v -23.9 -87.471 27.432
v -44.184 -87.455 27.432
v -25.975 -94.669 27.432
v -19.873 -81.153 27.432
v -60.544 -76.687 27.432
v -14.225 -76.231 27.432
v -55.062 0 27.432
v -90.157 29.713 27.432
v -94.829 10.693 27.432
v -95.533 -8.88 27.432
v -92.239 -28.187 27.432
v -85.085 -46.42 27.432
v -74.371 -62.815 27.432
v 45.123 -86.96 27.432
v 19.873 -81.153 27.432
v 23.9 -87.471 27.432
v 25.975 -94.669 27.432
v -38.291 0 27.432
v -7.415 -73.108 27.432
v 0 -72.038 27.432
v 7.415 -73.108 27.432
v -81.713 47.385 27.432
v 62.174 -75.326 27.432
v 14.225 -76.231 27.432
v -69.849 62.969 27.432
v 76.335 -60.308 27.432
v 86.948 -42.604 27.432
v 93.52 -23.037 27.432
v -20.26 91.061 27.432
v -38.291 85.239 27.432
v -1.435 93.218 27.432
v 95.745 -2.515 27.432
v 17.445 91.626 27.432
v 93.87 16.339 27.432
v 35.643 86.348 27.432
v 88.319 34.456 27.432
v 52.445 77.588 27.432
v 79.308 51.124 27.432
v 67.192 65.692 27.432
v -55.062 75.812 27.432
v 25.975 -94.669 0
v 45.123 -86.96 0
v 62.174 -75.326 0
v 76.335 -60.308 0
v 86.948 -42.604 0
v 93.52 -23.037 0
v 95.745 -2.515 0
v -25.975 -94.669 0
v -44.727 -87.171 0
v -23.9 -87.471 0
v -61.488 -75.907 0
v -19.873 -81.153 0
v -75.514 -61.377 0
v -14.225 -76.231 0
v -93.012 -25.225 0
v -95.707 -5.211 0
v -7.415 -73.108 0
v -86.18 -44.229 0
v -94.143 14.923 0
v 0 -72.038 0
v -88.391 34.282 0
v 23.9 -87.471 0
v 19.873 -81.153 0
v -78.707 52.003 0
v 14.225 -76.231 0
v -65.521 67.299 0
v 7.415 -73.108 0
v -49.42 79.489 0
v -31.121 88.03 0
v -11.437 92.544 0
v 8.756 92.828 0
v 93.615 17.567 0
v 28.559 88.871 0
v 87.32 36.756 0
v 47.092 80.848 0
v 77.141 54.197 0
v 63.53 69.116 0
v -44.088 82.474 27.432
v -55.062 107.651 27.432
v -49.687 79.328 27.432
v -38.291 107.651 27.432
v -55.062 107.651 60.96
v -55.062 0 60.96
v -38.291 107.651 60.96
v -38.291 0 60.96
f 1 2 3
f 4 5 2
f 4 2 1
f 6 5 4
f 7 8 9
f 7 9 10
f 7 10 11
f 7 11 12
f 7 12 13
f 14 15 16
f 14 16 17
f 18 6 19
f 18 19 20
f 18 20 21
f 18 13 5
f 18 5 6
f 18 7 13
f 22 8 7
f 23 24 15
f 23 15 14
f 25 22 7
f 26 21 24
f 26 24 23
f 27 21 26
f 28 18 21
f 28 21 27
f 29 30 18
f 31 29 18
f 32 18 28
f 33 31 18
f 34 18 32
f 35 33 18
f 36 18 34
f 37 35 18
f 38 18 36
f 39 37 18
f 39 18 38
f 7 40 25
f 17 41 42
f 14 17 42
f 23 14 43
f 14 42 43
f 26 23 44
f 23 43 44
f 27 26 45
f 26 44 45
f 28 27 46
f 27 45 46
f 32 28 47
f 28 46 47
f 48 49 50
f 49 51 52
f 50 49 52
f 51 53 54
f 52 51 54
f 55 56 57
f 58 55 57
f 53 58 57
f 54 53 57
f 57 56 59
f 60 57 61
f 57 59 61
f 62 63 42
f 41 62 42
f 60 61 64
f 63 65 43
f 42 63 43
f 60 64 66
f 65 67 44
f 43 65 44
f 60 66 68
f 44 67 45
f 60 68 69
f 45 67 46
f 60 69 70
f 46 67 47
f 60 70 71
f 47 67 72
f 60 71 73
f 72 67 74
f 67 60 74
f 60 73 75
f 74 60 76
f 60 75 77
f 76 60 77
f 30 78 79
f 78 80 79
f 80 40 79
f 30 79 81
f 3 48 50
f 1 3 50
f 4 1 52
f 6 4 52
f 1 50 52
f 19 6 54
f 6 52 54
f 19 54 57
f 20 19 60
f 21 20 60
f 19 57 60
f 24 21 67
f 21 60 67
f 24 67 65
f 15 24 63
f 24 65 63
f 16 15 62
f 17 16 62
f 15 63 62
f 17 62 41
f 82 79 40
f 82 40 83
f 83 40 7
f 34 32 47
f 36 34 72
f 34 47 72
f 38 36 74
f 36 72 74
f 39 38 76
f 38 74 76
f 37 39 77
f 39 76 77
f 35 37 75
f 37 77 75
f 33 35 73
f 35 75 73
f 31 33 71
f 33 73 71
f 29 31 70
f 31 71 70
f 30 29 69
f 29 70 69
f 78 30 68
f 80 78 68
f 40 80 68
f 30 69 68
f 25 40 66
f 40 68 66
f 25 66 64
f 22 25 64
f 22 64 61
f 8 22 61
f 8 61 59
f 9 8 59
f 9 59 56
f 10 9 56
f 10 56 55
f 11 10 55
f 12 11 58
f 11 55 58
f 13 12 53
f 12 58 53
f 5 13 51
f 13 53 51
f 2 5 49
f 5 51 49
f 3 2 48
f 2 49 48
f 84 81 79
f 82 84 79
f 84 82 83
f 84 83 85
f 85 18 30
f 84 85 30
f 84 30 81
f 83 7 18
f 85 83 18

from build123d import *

# Parameters (mm, degrees)
F3_DEPTH = 27.432
F5_DEPTH = 33.528


# Not quite as in the source:
# - the program builds the solid bodies; features that only make, move or delete a surface that nothing else refers to are left out


with BuildPart() as f3:
    # F2 (on Top) → F3 (new body)
    with BuildSketch(Plane.XY):
        with BuildLine():
            ThreePointArc((25.9753267238, -94.6690976426), (76.334874565, -60.3082301144), (95.7446020854, -2.515360713))
            ThreePointArc((95.7446020854, -2.515360713), (-57.7928694014, 73.819513852), (-25.9753267238, -94.6690976426))
            ThreePointArc((-25.9753267238, -94.6690976426), (0, -72.0376076224), (25.9753267238, -94.6690976426))
        make_face()
    extrude(amount=F3_DEPTH)

    # F4 (on face) → F5 (join)
    with BuildSketch(Plane.XY.offset(27.432)):
        with BuildLine():
            ThreePointArc((-55.0617836416, 75.8123407131), (-46.9138023818, 80.9479484388), (-38.2910855114, 85.23896453))
            Line((-38.2910855114, 85.23896453), (-38.2910855114, 107.650950551))
            Line((-38.2910855114, 107.650950551), (-55.0617836416, 107.650950551))
            Line((-55.0617836416, 107.650950551), (-55.0617836416, 75.8123407131))
        make_face()
        with BuildLine():
            Line((-55.0617836416, 0), (-38.2910855114, 0))
            Line((-38.2910855114, 0), (-38.2910855114, 85.23896453))
            ThreePointArc((-38.2910855114, 85.23896453), (-46.9138023818, 80.9479484388), (-55.0617836416, 75.8123407131))
            Line((-55.0617836416, 75.8123407131), (-55.0617836416, 0))
        make_face()
    extrude(amount=F5_DEPTH)


solid = f3.part
